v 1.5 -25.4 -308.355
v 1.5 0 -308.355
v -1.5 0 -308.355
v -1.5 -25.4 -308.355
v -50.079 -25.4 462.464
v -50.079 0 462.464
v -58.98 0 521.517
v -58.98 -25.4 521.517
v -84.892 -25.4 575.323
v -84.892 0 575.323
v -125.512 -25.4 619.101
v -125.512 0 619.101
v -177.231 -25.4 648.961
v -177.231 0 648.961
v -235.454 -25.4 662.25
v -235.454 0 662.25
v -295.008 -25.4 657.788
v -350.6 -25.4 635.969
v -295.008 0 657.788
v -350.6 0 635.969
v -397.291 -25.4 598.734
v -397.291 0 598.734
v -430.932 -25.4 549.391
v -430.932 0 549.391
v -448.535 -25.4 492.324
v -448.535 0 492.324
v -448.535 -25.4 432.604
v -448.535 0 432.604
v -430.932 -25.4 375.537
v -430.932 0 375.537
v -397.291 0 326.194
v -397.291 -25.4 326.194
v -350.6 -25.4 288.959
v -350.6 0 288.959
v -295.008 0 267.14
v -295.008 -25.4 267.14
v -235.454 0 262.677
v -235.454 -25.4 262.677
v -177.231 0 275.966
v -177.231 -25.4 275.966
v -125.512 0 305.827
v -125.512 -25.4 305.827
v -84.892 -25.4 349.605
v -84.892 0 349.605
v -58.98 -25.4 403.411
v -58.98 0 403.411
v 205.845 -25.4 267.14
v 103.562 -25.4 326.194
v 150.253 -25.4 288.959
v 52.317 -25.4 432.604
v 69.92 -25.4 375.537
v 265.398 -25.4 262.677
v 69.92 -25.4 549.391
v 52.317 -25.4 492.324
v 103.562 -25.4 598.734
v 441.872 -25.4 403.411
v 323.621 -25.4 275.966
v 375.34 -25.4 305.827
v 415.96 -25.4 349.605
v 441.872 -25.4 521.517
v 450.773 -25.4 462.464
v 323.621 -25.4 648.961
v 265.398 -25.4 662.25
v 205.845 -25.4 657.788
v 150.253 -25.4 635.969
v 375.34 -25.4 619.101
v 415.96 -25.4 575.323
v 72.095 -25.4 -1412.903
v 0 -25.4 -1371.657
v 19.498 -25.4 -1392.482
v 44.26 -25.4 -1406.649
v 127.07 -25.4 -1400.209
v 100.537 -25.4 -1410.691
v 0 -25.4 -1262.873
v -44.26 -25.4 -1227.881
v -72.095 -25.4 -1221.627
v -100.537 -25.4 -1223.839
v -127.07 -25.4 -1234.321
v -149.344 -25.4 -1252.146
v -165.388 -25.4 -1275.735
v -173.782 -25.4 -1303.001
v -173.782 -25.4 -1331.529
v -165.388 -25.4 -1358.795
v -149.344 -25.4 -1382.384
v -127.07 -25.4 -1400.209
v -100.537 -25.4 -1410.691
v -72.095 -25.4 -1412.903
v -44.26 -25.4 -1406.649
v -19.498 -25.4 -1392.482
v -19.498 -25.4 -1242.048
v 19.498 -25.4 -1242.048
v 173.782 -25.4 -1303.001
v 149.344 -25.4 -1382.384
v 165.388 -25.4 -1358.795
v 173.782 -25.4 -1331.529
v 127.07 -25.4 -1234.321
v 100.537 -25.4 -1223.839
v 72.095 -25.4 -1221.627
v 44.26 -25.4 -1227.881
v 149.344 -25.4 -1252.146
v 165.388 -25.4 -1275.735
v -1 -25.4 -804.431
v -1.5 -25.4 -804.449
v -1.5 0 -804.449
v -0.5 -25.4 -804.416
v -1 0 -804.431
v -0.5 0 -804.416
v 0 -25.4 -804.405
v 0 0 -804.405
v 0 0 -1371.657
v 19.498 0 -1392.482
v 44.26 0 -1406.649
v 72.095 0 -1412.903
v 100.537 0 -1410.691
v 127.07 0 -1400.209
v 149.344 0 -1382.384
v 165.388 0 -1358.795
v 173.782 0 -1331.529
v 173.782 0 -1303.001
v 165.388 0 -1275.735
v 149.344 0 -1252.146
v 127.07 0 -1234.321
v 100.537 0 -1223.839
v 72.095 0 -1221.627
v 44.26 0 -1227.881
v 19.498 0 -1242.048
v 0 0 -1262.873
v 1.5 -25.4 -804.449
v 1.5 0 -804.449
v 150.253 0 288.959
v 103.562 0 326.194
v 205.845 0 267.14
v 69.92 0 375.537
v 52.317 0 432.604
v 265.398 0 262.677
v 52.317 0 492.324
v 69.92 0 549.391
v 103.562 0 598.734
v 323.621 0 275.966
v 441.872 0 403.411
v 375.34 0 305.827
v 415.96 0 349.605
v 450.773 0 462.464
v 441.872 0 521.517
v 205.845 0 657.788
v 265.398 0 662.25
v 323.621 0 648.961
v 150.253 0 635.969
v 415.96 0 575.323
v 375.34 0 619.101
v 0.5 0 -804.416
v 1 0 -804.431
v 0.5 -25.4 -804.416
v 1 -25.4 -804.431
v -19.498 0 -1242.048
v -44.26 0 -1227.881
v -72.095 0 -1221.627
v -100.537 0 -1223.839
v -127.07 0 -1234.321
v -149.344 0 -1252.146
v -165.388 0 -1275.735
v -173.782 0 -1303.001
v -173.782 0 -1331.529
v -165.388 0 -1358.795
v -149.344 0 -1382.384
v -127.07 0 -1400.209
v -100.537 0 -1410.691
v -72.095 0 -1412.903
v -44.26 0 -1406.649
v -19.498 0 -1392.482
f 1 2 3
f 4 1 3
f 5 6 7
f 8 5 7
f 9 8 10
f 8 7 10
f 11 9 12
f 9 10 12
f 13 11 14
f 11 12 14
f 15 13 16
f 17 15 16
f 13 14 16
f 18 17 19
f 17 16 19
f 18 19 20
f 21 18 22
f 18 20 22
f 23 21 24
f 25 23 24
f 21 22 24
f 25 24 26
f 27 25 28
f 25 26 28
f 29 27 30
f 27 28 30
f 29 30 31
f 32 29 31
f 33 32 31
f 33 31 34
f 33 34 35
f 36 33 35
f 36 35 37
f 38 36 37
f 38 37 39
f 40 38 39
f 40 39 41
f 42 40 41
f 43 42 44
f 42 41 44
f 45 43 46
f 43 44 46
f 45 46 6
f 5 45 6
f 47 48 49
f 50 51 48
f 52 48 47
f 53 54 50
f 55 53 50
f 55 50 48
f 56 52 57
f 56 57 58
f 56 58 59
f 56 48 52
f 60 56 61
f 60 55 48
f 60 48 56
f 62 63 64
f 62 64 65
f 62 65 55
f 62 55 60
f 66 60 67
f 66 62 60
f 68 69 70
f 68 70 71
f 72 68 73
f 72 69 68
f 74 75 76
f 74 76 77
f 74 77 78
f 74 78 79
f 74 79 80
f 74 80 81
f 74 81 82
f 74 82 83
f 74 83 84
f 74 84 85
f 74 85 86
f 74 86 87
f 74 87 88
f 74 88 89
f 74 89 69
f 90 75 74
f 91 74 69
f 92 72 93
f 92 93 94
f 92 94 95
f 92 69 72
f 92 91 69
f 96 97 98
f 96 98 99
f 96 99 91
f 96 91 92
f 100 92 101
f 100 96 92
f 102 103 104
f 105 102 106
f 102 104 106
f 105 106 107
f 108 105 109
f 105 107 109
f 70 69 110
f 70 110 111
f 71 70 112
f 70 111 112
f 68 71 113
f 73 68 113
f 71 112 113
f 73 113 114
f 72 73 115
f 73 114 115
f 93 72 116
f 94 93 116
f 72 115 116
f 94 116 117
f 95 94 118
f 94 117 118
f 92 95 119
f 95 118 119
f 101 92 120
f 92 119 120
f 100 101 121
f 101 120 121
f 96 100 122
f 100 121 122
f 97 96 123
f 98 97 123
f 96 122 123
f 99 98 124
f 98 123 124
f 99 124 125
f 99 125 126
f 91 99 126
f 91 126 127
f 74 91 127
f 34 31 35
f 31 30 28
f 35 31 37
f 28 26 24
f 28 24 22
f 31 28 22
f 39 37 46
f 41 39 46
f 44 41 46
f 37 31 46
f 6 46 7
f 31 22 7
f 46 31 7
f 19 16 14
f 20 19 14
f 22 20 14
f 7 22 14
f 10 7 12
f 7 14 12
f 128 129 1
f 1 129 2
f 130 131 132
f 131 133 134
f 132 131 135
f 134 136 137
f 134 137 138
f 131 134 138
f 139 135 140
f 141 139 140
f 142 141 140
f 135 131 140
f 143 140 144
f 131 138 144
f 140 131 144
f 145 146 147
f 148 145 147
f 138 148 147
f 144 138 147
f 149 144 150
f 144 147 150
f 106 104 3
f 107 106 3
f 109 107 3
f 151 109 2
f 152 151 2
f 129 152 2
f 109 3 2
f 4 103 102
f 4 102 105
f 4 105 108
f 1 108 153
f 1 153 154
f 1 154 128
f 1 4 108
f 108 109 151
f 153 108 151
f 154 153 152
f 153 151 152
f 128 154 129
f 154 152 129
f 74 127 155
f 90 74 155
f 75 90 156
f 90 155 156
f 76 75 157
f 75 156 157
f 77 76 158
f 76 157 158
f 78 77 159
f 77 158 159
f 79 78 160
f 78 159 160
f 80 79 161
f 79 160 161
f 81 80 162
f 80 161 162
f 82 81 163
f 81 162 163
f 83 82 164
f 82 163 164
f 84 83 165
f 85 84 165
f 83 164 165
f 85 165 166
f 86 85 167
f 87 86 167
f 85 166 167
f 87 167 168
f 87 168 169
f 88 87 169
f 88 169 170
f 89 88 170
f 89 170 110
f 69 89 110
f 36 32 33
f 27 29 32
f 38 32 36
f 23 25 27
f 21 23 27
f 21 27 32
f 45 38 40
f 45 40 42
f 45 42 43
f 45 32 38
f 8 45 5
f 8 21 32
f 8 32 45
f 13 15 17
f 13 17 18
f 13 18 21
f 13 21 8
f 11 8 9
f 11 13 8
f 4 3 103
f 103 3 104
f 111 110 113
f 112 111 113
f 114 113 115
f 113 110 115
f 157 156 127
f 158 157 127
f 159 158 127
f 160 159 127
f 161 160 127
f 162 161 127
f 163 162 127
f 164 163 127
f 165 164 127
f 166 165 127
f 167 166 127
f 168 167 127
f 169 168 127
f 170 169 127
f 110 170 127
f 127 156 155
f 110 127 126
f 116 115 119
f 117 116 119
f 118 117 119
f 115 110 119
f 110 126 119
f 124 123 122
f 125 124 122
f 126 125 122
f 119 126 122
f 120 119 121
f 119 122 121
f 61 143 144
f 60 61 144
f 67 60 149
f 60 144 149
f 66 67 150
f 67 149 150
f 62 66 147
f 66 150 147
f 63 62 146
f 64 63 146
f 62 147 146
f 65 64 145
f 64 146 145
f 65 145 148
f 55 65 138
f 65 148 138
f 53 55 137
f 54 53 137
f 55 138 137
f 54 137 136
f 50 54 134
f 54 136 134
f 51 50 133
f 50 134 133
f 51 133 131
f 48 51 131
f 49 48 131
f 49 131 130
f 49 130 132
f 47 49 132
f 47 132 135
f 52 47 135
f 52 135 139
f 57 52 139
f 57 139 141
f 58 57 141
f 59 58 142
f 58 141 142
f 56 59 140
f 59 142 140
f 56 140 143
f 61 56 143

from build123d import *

# Parameters (mm, degrees)
F1_DEPTH = 25.4
F0_R     = 200.3467300335


with BuildPart() as f1:
    # F0 (on Front) → F1 (new body)
    with BuildSketch(Plane.XZ):
        with BuildLine():
            Line((1.5, -804.4493416321), (1.5, -308.3547353745))
            Line((1.5, -308.3547353745), (0, -308.3547353745))
            Line((0, -308.3547353745), (0, -804.4049214977))
            ThreePointArc((0, -804.4049214977), (0.7501190381, -804.4231118309), (1.5, -804.4493416321))
        make_face()
        with BuildLine():
            Line((0, -804.4049214977), (0, -308.3547353745))
            Line((0, -308.3547353745), (-1.5, -308.3547353745))
            Line((-1.5, -308.3547353745), (-1.5, -804.4493416321))
            ThreePointArc((-1.5, -804.4493416321), (-0.7501190381, -804.4231118309), (0, -804.4049214977))
        make_face()
    extrude(amount=F1_DEPTH)


with BuildPart() as f1b:
    # F0 (on Front) → F1, piece 2 (new body)
    with BuildSketch(Plane.XZ):
        with Locations((250.4261732101, 462.4638855457)):
            Circle(F0_R)
    extrude(amount=F1_DEPTH)


with BuildPart() as f1c:
    # F0 (on Front) → F1, piece 3 (new body)
    with BuildSketch(Plane.XZ):
        with BuildLine():
            ThreePointArc((0, -1371.6566112253), (12.592393534, -1345.7462755154), (16.9200763319, -1317.2649652732))
            ThreePointArc((16.9200763319, -1317.2649652732), (12.592393534, -1288.783655031), (0, -1262.8733193211))
            ThreePointArc((0, -1262.8733193211), (-16.9200763319, -1317.2649652732), (0, -1371.6566112253))
        make_face()
        with BuildLine():
            ThreePointArc((0, -1262.8733193211), (12.592393534, -1288.783655031), (16.9200763319, -1317.2649652732))
            ThreePointArc((16.9200763319, -1317.2649652732), (12.592393534, -1345.7462755154), (0, -1371.6566112253))
            ThreePointArc((0, -1371.6566112253), (107.4455570304, -1408.8216055954), (174.8485699083, -1317.2649652732))
            ThreePointArc((174.8485699083, -1317.2649652732), (107.4455570304, -1225.708324951), (0, -1262.8733193211))
        make_face()
        with BuildLine():
            ThreePointArc((0, -1371.6566112253), (-16.9200763319, -1317.2649652732), (0, -1262.8733193211))
            ThreePointArc((0, -1262.8733193211), (-174.8485699083, -1317.2649652732), (0, -1371.6566112253))
        make_face()
    extrude(amount=F1_DEPTH)


with BuildPart() as f1d:
    # F0 (on Front) → F1, piece 4 (new body)
    with BuildSketch(Plane.XZ):
        with Locations((-250.4261732101, 462.4638855457)):
            Circle(F0_R)
    extrude(amount=F1_DEPTH)


solid = Compound([f1.part, f1b.part, f1c.part, f1d.part])
